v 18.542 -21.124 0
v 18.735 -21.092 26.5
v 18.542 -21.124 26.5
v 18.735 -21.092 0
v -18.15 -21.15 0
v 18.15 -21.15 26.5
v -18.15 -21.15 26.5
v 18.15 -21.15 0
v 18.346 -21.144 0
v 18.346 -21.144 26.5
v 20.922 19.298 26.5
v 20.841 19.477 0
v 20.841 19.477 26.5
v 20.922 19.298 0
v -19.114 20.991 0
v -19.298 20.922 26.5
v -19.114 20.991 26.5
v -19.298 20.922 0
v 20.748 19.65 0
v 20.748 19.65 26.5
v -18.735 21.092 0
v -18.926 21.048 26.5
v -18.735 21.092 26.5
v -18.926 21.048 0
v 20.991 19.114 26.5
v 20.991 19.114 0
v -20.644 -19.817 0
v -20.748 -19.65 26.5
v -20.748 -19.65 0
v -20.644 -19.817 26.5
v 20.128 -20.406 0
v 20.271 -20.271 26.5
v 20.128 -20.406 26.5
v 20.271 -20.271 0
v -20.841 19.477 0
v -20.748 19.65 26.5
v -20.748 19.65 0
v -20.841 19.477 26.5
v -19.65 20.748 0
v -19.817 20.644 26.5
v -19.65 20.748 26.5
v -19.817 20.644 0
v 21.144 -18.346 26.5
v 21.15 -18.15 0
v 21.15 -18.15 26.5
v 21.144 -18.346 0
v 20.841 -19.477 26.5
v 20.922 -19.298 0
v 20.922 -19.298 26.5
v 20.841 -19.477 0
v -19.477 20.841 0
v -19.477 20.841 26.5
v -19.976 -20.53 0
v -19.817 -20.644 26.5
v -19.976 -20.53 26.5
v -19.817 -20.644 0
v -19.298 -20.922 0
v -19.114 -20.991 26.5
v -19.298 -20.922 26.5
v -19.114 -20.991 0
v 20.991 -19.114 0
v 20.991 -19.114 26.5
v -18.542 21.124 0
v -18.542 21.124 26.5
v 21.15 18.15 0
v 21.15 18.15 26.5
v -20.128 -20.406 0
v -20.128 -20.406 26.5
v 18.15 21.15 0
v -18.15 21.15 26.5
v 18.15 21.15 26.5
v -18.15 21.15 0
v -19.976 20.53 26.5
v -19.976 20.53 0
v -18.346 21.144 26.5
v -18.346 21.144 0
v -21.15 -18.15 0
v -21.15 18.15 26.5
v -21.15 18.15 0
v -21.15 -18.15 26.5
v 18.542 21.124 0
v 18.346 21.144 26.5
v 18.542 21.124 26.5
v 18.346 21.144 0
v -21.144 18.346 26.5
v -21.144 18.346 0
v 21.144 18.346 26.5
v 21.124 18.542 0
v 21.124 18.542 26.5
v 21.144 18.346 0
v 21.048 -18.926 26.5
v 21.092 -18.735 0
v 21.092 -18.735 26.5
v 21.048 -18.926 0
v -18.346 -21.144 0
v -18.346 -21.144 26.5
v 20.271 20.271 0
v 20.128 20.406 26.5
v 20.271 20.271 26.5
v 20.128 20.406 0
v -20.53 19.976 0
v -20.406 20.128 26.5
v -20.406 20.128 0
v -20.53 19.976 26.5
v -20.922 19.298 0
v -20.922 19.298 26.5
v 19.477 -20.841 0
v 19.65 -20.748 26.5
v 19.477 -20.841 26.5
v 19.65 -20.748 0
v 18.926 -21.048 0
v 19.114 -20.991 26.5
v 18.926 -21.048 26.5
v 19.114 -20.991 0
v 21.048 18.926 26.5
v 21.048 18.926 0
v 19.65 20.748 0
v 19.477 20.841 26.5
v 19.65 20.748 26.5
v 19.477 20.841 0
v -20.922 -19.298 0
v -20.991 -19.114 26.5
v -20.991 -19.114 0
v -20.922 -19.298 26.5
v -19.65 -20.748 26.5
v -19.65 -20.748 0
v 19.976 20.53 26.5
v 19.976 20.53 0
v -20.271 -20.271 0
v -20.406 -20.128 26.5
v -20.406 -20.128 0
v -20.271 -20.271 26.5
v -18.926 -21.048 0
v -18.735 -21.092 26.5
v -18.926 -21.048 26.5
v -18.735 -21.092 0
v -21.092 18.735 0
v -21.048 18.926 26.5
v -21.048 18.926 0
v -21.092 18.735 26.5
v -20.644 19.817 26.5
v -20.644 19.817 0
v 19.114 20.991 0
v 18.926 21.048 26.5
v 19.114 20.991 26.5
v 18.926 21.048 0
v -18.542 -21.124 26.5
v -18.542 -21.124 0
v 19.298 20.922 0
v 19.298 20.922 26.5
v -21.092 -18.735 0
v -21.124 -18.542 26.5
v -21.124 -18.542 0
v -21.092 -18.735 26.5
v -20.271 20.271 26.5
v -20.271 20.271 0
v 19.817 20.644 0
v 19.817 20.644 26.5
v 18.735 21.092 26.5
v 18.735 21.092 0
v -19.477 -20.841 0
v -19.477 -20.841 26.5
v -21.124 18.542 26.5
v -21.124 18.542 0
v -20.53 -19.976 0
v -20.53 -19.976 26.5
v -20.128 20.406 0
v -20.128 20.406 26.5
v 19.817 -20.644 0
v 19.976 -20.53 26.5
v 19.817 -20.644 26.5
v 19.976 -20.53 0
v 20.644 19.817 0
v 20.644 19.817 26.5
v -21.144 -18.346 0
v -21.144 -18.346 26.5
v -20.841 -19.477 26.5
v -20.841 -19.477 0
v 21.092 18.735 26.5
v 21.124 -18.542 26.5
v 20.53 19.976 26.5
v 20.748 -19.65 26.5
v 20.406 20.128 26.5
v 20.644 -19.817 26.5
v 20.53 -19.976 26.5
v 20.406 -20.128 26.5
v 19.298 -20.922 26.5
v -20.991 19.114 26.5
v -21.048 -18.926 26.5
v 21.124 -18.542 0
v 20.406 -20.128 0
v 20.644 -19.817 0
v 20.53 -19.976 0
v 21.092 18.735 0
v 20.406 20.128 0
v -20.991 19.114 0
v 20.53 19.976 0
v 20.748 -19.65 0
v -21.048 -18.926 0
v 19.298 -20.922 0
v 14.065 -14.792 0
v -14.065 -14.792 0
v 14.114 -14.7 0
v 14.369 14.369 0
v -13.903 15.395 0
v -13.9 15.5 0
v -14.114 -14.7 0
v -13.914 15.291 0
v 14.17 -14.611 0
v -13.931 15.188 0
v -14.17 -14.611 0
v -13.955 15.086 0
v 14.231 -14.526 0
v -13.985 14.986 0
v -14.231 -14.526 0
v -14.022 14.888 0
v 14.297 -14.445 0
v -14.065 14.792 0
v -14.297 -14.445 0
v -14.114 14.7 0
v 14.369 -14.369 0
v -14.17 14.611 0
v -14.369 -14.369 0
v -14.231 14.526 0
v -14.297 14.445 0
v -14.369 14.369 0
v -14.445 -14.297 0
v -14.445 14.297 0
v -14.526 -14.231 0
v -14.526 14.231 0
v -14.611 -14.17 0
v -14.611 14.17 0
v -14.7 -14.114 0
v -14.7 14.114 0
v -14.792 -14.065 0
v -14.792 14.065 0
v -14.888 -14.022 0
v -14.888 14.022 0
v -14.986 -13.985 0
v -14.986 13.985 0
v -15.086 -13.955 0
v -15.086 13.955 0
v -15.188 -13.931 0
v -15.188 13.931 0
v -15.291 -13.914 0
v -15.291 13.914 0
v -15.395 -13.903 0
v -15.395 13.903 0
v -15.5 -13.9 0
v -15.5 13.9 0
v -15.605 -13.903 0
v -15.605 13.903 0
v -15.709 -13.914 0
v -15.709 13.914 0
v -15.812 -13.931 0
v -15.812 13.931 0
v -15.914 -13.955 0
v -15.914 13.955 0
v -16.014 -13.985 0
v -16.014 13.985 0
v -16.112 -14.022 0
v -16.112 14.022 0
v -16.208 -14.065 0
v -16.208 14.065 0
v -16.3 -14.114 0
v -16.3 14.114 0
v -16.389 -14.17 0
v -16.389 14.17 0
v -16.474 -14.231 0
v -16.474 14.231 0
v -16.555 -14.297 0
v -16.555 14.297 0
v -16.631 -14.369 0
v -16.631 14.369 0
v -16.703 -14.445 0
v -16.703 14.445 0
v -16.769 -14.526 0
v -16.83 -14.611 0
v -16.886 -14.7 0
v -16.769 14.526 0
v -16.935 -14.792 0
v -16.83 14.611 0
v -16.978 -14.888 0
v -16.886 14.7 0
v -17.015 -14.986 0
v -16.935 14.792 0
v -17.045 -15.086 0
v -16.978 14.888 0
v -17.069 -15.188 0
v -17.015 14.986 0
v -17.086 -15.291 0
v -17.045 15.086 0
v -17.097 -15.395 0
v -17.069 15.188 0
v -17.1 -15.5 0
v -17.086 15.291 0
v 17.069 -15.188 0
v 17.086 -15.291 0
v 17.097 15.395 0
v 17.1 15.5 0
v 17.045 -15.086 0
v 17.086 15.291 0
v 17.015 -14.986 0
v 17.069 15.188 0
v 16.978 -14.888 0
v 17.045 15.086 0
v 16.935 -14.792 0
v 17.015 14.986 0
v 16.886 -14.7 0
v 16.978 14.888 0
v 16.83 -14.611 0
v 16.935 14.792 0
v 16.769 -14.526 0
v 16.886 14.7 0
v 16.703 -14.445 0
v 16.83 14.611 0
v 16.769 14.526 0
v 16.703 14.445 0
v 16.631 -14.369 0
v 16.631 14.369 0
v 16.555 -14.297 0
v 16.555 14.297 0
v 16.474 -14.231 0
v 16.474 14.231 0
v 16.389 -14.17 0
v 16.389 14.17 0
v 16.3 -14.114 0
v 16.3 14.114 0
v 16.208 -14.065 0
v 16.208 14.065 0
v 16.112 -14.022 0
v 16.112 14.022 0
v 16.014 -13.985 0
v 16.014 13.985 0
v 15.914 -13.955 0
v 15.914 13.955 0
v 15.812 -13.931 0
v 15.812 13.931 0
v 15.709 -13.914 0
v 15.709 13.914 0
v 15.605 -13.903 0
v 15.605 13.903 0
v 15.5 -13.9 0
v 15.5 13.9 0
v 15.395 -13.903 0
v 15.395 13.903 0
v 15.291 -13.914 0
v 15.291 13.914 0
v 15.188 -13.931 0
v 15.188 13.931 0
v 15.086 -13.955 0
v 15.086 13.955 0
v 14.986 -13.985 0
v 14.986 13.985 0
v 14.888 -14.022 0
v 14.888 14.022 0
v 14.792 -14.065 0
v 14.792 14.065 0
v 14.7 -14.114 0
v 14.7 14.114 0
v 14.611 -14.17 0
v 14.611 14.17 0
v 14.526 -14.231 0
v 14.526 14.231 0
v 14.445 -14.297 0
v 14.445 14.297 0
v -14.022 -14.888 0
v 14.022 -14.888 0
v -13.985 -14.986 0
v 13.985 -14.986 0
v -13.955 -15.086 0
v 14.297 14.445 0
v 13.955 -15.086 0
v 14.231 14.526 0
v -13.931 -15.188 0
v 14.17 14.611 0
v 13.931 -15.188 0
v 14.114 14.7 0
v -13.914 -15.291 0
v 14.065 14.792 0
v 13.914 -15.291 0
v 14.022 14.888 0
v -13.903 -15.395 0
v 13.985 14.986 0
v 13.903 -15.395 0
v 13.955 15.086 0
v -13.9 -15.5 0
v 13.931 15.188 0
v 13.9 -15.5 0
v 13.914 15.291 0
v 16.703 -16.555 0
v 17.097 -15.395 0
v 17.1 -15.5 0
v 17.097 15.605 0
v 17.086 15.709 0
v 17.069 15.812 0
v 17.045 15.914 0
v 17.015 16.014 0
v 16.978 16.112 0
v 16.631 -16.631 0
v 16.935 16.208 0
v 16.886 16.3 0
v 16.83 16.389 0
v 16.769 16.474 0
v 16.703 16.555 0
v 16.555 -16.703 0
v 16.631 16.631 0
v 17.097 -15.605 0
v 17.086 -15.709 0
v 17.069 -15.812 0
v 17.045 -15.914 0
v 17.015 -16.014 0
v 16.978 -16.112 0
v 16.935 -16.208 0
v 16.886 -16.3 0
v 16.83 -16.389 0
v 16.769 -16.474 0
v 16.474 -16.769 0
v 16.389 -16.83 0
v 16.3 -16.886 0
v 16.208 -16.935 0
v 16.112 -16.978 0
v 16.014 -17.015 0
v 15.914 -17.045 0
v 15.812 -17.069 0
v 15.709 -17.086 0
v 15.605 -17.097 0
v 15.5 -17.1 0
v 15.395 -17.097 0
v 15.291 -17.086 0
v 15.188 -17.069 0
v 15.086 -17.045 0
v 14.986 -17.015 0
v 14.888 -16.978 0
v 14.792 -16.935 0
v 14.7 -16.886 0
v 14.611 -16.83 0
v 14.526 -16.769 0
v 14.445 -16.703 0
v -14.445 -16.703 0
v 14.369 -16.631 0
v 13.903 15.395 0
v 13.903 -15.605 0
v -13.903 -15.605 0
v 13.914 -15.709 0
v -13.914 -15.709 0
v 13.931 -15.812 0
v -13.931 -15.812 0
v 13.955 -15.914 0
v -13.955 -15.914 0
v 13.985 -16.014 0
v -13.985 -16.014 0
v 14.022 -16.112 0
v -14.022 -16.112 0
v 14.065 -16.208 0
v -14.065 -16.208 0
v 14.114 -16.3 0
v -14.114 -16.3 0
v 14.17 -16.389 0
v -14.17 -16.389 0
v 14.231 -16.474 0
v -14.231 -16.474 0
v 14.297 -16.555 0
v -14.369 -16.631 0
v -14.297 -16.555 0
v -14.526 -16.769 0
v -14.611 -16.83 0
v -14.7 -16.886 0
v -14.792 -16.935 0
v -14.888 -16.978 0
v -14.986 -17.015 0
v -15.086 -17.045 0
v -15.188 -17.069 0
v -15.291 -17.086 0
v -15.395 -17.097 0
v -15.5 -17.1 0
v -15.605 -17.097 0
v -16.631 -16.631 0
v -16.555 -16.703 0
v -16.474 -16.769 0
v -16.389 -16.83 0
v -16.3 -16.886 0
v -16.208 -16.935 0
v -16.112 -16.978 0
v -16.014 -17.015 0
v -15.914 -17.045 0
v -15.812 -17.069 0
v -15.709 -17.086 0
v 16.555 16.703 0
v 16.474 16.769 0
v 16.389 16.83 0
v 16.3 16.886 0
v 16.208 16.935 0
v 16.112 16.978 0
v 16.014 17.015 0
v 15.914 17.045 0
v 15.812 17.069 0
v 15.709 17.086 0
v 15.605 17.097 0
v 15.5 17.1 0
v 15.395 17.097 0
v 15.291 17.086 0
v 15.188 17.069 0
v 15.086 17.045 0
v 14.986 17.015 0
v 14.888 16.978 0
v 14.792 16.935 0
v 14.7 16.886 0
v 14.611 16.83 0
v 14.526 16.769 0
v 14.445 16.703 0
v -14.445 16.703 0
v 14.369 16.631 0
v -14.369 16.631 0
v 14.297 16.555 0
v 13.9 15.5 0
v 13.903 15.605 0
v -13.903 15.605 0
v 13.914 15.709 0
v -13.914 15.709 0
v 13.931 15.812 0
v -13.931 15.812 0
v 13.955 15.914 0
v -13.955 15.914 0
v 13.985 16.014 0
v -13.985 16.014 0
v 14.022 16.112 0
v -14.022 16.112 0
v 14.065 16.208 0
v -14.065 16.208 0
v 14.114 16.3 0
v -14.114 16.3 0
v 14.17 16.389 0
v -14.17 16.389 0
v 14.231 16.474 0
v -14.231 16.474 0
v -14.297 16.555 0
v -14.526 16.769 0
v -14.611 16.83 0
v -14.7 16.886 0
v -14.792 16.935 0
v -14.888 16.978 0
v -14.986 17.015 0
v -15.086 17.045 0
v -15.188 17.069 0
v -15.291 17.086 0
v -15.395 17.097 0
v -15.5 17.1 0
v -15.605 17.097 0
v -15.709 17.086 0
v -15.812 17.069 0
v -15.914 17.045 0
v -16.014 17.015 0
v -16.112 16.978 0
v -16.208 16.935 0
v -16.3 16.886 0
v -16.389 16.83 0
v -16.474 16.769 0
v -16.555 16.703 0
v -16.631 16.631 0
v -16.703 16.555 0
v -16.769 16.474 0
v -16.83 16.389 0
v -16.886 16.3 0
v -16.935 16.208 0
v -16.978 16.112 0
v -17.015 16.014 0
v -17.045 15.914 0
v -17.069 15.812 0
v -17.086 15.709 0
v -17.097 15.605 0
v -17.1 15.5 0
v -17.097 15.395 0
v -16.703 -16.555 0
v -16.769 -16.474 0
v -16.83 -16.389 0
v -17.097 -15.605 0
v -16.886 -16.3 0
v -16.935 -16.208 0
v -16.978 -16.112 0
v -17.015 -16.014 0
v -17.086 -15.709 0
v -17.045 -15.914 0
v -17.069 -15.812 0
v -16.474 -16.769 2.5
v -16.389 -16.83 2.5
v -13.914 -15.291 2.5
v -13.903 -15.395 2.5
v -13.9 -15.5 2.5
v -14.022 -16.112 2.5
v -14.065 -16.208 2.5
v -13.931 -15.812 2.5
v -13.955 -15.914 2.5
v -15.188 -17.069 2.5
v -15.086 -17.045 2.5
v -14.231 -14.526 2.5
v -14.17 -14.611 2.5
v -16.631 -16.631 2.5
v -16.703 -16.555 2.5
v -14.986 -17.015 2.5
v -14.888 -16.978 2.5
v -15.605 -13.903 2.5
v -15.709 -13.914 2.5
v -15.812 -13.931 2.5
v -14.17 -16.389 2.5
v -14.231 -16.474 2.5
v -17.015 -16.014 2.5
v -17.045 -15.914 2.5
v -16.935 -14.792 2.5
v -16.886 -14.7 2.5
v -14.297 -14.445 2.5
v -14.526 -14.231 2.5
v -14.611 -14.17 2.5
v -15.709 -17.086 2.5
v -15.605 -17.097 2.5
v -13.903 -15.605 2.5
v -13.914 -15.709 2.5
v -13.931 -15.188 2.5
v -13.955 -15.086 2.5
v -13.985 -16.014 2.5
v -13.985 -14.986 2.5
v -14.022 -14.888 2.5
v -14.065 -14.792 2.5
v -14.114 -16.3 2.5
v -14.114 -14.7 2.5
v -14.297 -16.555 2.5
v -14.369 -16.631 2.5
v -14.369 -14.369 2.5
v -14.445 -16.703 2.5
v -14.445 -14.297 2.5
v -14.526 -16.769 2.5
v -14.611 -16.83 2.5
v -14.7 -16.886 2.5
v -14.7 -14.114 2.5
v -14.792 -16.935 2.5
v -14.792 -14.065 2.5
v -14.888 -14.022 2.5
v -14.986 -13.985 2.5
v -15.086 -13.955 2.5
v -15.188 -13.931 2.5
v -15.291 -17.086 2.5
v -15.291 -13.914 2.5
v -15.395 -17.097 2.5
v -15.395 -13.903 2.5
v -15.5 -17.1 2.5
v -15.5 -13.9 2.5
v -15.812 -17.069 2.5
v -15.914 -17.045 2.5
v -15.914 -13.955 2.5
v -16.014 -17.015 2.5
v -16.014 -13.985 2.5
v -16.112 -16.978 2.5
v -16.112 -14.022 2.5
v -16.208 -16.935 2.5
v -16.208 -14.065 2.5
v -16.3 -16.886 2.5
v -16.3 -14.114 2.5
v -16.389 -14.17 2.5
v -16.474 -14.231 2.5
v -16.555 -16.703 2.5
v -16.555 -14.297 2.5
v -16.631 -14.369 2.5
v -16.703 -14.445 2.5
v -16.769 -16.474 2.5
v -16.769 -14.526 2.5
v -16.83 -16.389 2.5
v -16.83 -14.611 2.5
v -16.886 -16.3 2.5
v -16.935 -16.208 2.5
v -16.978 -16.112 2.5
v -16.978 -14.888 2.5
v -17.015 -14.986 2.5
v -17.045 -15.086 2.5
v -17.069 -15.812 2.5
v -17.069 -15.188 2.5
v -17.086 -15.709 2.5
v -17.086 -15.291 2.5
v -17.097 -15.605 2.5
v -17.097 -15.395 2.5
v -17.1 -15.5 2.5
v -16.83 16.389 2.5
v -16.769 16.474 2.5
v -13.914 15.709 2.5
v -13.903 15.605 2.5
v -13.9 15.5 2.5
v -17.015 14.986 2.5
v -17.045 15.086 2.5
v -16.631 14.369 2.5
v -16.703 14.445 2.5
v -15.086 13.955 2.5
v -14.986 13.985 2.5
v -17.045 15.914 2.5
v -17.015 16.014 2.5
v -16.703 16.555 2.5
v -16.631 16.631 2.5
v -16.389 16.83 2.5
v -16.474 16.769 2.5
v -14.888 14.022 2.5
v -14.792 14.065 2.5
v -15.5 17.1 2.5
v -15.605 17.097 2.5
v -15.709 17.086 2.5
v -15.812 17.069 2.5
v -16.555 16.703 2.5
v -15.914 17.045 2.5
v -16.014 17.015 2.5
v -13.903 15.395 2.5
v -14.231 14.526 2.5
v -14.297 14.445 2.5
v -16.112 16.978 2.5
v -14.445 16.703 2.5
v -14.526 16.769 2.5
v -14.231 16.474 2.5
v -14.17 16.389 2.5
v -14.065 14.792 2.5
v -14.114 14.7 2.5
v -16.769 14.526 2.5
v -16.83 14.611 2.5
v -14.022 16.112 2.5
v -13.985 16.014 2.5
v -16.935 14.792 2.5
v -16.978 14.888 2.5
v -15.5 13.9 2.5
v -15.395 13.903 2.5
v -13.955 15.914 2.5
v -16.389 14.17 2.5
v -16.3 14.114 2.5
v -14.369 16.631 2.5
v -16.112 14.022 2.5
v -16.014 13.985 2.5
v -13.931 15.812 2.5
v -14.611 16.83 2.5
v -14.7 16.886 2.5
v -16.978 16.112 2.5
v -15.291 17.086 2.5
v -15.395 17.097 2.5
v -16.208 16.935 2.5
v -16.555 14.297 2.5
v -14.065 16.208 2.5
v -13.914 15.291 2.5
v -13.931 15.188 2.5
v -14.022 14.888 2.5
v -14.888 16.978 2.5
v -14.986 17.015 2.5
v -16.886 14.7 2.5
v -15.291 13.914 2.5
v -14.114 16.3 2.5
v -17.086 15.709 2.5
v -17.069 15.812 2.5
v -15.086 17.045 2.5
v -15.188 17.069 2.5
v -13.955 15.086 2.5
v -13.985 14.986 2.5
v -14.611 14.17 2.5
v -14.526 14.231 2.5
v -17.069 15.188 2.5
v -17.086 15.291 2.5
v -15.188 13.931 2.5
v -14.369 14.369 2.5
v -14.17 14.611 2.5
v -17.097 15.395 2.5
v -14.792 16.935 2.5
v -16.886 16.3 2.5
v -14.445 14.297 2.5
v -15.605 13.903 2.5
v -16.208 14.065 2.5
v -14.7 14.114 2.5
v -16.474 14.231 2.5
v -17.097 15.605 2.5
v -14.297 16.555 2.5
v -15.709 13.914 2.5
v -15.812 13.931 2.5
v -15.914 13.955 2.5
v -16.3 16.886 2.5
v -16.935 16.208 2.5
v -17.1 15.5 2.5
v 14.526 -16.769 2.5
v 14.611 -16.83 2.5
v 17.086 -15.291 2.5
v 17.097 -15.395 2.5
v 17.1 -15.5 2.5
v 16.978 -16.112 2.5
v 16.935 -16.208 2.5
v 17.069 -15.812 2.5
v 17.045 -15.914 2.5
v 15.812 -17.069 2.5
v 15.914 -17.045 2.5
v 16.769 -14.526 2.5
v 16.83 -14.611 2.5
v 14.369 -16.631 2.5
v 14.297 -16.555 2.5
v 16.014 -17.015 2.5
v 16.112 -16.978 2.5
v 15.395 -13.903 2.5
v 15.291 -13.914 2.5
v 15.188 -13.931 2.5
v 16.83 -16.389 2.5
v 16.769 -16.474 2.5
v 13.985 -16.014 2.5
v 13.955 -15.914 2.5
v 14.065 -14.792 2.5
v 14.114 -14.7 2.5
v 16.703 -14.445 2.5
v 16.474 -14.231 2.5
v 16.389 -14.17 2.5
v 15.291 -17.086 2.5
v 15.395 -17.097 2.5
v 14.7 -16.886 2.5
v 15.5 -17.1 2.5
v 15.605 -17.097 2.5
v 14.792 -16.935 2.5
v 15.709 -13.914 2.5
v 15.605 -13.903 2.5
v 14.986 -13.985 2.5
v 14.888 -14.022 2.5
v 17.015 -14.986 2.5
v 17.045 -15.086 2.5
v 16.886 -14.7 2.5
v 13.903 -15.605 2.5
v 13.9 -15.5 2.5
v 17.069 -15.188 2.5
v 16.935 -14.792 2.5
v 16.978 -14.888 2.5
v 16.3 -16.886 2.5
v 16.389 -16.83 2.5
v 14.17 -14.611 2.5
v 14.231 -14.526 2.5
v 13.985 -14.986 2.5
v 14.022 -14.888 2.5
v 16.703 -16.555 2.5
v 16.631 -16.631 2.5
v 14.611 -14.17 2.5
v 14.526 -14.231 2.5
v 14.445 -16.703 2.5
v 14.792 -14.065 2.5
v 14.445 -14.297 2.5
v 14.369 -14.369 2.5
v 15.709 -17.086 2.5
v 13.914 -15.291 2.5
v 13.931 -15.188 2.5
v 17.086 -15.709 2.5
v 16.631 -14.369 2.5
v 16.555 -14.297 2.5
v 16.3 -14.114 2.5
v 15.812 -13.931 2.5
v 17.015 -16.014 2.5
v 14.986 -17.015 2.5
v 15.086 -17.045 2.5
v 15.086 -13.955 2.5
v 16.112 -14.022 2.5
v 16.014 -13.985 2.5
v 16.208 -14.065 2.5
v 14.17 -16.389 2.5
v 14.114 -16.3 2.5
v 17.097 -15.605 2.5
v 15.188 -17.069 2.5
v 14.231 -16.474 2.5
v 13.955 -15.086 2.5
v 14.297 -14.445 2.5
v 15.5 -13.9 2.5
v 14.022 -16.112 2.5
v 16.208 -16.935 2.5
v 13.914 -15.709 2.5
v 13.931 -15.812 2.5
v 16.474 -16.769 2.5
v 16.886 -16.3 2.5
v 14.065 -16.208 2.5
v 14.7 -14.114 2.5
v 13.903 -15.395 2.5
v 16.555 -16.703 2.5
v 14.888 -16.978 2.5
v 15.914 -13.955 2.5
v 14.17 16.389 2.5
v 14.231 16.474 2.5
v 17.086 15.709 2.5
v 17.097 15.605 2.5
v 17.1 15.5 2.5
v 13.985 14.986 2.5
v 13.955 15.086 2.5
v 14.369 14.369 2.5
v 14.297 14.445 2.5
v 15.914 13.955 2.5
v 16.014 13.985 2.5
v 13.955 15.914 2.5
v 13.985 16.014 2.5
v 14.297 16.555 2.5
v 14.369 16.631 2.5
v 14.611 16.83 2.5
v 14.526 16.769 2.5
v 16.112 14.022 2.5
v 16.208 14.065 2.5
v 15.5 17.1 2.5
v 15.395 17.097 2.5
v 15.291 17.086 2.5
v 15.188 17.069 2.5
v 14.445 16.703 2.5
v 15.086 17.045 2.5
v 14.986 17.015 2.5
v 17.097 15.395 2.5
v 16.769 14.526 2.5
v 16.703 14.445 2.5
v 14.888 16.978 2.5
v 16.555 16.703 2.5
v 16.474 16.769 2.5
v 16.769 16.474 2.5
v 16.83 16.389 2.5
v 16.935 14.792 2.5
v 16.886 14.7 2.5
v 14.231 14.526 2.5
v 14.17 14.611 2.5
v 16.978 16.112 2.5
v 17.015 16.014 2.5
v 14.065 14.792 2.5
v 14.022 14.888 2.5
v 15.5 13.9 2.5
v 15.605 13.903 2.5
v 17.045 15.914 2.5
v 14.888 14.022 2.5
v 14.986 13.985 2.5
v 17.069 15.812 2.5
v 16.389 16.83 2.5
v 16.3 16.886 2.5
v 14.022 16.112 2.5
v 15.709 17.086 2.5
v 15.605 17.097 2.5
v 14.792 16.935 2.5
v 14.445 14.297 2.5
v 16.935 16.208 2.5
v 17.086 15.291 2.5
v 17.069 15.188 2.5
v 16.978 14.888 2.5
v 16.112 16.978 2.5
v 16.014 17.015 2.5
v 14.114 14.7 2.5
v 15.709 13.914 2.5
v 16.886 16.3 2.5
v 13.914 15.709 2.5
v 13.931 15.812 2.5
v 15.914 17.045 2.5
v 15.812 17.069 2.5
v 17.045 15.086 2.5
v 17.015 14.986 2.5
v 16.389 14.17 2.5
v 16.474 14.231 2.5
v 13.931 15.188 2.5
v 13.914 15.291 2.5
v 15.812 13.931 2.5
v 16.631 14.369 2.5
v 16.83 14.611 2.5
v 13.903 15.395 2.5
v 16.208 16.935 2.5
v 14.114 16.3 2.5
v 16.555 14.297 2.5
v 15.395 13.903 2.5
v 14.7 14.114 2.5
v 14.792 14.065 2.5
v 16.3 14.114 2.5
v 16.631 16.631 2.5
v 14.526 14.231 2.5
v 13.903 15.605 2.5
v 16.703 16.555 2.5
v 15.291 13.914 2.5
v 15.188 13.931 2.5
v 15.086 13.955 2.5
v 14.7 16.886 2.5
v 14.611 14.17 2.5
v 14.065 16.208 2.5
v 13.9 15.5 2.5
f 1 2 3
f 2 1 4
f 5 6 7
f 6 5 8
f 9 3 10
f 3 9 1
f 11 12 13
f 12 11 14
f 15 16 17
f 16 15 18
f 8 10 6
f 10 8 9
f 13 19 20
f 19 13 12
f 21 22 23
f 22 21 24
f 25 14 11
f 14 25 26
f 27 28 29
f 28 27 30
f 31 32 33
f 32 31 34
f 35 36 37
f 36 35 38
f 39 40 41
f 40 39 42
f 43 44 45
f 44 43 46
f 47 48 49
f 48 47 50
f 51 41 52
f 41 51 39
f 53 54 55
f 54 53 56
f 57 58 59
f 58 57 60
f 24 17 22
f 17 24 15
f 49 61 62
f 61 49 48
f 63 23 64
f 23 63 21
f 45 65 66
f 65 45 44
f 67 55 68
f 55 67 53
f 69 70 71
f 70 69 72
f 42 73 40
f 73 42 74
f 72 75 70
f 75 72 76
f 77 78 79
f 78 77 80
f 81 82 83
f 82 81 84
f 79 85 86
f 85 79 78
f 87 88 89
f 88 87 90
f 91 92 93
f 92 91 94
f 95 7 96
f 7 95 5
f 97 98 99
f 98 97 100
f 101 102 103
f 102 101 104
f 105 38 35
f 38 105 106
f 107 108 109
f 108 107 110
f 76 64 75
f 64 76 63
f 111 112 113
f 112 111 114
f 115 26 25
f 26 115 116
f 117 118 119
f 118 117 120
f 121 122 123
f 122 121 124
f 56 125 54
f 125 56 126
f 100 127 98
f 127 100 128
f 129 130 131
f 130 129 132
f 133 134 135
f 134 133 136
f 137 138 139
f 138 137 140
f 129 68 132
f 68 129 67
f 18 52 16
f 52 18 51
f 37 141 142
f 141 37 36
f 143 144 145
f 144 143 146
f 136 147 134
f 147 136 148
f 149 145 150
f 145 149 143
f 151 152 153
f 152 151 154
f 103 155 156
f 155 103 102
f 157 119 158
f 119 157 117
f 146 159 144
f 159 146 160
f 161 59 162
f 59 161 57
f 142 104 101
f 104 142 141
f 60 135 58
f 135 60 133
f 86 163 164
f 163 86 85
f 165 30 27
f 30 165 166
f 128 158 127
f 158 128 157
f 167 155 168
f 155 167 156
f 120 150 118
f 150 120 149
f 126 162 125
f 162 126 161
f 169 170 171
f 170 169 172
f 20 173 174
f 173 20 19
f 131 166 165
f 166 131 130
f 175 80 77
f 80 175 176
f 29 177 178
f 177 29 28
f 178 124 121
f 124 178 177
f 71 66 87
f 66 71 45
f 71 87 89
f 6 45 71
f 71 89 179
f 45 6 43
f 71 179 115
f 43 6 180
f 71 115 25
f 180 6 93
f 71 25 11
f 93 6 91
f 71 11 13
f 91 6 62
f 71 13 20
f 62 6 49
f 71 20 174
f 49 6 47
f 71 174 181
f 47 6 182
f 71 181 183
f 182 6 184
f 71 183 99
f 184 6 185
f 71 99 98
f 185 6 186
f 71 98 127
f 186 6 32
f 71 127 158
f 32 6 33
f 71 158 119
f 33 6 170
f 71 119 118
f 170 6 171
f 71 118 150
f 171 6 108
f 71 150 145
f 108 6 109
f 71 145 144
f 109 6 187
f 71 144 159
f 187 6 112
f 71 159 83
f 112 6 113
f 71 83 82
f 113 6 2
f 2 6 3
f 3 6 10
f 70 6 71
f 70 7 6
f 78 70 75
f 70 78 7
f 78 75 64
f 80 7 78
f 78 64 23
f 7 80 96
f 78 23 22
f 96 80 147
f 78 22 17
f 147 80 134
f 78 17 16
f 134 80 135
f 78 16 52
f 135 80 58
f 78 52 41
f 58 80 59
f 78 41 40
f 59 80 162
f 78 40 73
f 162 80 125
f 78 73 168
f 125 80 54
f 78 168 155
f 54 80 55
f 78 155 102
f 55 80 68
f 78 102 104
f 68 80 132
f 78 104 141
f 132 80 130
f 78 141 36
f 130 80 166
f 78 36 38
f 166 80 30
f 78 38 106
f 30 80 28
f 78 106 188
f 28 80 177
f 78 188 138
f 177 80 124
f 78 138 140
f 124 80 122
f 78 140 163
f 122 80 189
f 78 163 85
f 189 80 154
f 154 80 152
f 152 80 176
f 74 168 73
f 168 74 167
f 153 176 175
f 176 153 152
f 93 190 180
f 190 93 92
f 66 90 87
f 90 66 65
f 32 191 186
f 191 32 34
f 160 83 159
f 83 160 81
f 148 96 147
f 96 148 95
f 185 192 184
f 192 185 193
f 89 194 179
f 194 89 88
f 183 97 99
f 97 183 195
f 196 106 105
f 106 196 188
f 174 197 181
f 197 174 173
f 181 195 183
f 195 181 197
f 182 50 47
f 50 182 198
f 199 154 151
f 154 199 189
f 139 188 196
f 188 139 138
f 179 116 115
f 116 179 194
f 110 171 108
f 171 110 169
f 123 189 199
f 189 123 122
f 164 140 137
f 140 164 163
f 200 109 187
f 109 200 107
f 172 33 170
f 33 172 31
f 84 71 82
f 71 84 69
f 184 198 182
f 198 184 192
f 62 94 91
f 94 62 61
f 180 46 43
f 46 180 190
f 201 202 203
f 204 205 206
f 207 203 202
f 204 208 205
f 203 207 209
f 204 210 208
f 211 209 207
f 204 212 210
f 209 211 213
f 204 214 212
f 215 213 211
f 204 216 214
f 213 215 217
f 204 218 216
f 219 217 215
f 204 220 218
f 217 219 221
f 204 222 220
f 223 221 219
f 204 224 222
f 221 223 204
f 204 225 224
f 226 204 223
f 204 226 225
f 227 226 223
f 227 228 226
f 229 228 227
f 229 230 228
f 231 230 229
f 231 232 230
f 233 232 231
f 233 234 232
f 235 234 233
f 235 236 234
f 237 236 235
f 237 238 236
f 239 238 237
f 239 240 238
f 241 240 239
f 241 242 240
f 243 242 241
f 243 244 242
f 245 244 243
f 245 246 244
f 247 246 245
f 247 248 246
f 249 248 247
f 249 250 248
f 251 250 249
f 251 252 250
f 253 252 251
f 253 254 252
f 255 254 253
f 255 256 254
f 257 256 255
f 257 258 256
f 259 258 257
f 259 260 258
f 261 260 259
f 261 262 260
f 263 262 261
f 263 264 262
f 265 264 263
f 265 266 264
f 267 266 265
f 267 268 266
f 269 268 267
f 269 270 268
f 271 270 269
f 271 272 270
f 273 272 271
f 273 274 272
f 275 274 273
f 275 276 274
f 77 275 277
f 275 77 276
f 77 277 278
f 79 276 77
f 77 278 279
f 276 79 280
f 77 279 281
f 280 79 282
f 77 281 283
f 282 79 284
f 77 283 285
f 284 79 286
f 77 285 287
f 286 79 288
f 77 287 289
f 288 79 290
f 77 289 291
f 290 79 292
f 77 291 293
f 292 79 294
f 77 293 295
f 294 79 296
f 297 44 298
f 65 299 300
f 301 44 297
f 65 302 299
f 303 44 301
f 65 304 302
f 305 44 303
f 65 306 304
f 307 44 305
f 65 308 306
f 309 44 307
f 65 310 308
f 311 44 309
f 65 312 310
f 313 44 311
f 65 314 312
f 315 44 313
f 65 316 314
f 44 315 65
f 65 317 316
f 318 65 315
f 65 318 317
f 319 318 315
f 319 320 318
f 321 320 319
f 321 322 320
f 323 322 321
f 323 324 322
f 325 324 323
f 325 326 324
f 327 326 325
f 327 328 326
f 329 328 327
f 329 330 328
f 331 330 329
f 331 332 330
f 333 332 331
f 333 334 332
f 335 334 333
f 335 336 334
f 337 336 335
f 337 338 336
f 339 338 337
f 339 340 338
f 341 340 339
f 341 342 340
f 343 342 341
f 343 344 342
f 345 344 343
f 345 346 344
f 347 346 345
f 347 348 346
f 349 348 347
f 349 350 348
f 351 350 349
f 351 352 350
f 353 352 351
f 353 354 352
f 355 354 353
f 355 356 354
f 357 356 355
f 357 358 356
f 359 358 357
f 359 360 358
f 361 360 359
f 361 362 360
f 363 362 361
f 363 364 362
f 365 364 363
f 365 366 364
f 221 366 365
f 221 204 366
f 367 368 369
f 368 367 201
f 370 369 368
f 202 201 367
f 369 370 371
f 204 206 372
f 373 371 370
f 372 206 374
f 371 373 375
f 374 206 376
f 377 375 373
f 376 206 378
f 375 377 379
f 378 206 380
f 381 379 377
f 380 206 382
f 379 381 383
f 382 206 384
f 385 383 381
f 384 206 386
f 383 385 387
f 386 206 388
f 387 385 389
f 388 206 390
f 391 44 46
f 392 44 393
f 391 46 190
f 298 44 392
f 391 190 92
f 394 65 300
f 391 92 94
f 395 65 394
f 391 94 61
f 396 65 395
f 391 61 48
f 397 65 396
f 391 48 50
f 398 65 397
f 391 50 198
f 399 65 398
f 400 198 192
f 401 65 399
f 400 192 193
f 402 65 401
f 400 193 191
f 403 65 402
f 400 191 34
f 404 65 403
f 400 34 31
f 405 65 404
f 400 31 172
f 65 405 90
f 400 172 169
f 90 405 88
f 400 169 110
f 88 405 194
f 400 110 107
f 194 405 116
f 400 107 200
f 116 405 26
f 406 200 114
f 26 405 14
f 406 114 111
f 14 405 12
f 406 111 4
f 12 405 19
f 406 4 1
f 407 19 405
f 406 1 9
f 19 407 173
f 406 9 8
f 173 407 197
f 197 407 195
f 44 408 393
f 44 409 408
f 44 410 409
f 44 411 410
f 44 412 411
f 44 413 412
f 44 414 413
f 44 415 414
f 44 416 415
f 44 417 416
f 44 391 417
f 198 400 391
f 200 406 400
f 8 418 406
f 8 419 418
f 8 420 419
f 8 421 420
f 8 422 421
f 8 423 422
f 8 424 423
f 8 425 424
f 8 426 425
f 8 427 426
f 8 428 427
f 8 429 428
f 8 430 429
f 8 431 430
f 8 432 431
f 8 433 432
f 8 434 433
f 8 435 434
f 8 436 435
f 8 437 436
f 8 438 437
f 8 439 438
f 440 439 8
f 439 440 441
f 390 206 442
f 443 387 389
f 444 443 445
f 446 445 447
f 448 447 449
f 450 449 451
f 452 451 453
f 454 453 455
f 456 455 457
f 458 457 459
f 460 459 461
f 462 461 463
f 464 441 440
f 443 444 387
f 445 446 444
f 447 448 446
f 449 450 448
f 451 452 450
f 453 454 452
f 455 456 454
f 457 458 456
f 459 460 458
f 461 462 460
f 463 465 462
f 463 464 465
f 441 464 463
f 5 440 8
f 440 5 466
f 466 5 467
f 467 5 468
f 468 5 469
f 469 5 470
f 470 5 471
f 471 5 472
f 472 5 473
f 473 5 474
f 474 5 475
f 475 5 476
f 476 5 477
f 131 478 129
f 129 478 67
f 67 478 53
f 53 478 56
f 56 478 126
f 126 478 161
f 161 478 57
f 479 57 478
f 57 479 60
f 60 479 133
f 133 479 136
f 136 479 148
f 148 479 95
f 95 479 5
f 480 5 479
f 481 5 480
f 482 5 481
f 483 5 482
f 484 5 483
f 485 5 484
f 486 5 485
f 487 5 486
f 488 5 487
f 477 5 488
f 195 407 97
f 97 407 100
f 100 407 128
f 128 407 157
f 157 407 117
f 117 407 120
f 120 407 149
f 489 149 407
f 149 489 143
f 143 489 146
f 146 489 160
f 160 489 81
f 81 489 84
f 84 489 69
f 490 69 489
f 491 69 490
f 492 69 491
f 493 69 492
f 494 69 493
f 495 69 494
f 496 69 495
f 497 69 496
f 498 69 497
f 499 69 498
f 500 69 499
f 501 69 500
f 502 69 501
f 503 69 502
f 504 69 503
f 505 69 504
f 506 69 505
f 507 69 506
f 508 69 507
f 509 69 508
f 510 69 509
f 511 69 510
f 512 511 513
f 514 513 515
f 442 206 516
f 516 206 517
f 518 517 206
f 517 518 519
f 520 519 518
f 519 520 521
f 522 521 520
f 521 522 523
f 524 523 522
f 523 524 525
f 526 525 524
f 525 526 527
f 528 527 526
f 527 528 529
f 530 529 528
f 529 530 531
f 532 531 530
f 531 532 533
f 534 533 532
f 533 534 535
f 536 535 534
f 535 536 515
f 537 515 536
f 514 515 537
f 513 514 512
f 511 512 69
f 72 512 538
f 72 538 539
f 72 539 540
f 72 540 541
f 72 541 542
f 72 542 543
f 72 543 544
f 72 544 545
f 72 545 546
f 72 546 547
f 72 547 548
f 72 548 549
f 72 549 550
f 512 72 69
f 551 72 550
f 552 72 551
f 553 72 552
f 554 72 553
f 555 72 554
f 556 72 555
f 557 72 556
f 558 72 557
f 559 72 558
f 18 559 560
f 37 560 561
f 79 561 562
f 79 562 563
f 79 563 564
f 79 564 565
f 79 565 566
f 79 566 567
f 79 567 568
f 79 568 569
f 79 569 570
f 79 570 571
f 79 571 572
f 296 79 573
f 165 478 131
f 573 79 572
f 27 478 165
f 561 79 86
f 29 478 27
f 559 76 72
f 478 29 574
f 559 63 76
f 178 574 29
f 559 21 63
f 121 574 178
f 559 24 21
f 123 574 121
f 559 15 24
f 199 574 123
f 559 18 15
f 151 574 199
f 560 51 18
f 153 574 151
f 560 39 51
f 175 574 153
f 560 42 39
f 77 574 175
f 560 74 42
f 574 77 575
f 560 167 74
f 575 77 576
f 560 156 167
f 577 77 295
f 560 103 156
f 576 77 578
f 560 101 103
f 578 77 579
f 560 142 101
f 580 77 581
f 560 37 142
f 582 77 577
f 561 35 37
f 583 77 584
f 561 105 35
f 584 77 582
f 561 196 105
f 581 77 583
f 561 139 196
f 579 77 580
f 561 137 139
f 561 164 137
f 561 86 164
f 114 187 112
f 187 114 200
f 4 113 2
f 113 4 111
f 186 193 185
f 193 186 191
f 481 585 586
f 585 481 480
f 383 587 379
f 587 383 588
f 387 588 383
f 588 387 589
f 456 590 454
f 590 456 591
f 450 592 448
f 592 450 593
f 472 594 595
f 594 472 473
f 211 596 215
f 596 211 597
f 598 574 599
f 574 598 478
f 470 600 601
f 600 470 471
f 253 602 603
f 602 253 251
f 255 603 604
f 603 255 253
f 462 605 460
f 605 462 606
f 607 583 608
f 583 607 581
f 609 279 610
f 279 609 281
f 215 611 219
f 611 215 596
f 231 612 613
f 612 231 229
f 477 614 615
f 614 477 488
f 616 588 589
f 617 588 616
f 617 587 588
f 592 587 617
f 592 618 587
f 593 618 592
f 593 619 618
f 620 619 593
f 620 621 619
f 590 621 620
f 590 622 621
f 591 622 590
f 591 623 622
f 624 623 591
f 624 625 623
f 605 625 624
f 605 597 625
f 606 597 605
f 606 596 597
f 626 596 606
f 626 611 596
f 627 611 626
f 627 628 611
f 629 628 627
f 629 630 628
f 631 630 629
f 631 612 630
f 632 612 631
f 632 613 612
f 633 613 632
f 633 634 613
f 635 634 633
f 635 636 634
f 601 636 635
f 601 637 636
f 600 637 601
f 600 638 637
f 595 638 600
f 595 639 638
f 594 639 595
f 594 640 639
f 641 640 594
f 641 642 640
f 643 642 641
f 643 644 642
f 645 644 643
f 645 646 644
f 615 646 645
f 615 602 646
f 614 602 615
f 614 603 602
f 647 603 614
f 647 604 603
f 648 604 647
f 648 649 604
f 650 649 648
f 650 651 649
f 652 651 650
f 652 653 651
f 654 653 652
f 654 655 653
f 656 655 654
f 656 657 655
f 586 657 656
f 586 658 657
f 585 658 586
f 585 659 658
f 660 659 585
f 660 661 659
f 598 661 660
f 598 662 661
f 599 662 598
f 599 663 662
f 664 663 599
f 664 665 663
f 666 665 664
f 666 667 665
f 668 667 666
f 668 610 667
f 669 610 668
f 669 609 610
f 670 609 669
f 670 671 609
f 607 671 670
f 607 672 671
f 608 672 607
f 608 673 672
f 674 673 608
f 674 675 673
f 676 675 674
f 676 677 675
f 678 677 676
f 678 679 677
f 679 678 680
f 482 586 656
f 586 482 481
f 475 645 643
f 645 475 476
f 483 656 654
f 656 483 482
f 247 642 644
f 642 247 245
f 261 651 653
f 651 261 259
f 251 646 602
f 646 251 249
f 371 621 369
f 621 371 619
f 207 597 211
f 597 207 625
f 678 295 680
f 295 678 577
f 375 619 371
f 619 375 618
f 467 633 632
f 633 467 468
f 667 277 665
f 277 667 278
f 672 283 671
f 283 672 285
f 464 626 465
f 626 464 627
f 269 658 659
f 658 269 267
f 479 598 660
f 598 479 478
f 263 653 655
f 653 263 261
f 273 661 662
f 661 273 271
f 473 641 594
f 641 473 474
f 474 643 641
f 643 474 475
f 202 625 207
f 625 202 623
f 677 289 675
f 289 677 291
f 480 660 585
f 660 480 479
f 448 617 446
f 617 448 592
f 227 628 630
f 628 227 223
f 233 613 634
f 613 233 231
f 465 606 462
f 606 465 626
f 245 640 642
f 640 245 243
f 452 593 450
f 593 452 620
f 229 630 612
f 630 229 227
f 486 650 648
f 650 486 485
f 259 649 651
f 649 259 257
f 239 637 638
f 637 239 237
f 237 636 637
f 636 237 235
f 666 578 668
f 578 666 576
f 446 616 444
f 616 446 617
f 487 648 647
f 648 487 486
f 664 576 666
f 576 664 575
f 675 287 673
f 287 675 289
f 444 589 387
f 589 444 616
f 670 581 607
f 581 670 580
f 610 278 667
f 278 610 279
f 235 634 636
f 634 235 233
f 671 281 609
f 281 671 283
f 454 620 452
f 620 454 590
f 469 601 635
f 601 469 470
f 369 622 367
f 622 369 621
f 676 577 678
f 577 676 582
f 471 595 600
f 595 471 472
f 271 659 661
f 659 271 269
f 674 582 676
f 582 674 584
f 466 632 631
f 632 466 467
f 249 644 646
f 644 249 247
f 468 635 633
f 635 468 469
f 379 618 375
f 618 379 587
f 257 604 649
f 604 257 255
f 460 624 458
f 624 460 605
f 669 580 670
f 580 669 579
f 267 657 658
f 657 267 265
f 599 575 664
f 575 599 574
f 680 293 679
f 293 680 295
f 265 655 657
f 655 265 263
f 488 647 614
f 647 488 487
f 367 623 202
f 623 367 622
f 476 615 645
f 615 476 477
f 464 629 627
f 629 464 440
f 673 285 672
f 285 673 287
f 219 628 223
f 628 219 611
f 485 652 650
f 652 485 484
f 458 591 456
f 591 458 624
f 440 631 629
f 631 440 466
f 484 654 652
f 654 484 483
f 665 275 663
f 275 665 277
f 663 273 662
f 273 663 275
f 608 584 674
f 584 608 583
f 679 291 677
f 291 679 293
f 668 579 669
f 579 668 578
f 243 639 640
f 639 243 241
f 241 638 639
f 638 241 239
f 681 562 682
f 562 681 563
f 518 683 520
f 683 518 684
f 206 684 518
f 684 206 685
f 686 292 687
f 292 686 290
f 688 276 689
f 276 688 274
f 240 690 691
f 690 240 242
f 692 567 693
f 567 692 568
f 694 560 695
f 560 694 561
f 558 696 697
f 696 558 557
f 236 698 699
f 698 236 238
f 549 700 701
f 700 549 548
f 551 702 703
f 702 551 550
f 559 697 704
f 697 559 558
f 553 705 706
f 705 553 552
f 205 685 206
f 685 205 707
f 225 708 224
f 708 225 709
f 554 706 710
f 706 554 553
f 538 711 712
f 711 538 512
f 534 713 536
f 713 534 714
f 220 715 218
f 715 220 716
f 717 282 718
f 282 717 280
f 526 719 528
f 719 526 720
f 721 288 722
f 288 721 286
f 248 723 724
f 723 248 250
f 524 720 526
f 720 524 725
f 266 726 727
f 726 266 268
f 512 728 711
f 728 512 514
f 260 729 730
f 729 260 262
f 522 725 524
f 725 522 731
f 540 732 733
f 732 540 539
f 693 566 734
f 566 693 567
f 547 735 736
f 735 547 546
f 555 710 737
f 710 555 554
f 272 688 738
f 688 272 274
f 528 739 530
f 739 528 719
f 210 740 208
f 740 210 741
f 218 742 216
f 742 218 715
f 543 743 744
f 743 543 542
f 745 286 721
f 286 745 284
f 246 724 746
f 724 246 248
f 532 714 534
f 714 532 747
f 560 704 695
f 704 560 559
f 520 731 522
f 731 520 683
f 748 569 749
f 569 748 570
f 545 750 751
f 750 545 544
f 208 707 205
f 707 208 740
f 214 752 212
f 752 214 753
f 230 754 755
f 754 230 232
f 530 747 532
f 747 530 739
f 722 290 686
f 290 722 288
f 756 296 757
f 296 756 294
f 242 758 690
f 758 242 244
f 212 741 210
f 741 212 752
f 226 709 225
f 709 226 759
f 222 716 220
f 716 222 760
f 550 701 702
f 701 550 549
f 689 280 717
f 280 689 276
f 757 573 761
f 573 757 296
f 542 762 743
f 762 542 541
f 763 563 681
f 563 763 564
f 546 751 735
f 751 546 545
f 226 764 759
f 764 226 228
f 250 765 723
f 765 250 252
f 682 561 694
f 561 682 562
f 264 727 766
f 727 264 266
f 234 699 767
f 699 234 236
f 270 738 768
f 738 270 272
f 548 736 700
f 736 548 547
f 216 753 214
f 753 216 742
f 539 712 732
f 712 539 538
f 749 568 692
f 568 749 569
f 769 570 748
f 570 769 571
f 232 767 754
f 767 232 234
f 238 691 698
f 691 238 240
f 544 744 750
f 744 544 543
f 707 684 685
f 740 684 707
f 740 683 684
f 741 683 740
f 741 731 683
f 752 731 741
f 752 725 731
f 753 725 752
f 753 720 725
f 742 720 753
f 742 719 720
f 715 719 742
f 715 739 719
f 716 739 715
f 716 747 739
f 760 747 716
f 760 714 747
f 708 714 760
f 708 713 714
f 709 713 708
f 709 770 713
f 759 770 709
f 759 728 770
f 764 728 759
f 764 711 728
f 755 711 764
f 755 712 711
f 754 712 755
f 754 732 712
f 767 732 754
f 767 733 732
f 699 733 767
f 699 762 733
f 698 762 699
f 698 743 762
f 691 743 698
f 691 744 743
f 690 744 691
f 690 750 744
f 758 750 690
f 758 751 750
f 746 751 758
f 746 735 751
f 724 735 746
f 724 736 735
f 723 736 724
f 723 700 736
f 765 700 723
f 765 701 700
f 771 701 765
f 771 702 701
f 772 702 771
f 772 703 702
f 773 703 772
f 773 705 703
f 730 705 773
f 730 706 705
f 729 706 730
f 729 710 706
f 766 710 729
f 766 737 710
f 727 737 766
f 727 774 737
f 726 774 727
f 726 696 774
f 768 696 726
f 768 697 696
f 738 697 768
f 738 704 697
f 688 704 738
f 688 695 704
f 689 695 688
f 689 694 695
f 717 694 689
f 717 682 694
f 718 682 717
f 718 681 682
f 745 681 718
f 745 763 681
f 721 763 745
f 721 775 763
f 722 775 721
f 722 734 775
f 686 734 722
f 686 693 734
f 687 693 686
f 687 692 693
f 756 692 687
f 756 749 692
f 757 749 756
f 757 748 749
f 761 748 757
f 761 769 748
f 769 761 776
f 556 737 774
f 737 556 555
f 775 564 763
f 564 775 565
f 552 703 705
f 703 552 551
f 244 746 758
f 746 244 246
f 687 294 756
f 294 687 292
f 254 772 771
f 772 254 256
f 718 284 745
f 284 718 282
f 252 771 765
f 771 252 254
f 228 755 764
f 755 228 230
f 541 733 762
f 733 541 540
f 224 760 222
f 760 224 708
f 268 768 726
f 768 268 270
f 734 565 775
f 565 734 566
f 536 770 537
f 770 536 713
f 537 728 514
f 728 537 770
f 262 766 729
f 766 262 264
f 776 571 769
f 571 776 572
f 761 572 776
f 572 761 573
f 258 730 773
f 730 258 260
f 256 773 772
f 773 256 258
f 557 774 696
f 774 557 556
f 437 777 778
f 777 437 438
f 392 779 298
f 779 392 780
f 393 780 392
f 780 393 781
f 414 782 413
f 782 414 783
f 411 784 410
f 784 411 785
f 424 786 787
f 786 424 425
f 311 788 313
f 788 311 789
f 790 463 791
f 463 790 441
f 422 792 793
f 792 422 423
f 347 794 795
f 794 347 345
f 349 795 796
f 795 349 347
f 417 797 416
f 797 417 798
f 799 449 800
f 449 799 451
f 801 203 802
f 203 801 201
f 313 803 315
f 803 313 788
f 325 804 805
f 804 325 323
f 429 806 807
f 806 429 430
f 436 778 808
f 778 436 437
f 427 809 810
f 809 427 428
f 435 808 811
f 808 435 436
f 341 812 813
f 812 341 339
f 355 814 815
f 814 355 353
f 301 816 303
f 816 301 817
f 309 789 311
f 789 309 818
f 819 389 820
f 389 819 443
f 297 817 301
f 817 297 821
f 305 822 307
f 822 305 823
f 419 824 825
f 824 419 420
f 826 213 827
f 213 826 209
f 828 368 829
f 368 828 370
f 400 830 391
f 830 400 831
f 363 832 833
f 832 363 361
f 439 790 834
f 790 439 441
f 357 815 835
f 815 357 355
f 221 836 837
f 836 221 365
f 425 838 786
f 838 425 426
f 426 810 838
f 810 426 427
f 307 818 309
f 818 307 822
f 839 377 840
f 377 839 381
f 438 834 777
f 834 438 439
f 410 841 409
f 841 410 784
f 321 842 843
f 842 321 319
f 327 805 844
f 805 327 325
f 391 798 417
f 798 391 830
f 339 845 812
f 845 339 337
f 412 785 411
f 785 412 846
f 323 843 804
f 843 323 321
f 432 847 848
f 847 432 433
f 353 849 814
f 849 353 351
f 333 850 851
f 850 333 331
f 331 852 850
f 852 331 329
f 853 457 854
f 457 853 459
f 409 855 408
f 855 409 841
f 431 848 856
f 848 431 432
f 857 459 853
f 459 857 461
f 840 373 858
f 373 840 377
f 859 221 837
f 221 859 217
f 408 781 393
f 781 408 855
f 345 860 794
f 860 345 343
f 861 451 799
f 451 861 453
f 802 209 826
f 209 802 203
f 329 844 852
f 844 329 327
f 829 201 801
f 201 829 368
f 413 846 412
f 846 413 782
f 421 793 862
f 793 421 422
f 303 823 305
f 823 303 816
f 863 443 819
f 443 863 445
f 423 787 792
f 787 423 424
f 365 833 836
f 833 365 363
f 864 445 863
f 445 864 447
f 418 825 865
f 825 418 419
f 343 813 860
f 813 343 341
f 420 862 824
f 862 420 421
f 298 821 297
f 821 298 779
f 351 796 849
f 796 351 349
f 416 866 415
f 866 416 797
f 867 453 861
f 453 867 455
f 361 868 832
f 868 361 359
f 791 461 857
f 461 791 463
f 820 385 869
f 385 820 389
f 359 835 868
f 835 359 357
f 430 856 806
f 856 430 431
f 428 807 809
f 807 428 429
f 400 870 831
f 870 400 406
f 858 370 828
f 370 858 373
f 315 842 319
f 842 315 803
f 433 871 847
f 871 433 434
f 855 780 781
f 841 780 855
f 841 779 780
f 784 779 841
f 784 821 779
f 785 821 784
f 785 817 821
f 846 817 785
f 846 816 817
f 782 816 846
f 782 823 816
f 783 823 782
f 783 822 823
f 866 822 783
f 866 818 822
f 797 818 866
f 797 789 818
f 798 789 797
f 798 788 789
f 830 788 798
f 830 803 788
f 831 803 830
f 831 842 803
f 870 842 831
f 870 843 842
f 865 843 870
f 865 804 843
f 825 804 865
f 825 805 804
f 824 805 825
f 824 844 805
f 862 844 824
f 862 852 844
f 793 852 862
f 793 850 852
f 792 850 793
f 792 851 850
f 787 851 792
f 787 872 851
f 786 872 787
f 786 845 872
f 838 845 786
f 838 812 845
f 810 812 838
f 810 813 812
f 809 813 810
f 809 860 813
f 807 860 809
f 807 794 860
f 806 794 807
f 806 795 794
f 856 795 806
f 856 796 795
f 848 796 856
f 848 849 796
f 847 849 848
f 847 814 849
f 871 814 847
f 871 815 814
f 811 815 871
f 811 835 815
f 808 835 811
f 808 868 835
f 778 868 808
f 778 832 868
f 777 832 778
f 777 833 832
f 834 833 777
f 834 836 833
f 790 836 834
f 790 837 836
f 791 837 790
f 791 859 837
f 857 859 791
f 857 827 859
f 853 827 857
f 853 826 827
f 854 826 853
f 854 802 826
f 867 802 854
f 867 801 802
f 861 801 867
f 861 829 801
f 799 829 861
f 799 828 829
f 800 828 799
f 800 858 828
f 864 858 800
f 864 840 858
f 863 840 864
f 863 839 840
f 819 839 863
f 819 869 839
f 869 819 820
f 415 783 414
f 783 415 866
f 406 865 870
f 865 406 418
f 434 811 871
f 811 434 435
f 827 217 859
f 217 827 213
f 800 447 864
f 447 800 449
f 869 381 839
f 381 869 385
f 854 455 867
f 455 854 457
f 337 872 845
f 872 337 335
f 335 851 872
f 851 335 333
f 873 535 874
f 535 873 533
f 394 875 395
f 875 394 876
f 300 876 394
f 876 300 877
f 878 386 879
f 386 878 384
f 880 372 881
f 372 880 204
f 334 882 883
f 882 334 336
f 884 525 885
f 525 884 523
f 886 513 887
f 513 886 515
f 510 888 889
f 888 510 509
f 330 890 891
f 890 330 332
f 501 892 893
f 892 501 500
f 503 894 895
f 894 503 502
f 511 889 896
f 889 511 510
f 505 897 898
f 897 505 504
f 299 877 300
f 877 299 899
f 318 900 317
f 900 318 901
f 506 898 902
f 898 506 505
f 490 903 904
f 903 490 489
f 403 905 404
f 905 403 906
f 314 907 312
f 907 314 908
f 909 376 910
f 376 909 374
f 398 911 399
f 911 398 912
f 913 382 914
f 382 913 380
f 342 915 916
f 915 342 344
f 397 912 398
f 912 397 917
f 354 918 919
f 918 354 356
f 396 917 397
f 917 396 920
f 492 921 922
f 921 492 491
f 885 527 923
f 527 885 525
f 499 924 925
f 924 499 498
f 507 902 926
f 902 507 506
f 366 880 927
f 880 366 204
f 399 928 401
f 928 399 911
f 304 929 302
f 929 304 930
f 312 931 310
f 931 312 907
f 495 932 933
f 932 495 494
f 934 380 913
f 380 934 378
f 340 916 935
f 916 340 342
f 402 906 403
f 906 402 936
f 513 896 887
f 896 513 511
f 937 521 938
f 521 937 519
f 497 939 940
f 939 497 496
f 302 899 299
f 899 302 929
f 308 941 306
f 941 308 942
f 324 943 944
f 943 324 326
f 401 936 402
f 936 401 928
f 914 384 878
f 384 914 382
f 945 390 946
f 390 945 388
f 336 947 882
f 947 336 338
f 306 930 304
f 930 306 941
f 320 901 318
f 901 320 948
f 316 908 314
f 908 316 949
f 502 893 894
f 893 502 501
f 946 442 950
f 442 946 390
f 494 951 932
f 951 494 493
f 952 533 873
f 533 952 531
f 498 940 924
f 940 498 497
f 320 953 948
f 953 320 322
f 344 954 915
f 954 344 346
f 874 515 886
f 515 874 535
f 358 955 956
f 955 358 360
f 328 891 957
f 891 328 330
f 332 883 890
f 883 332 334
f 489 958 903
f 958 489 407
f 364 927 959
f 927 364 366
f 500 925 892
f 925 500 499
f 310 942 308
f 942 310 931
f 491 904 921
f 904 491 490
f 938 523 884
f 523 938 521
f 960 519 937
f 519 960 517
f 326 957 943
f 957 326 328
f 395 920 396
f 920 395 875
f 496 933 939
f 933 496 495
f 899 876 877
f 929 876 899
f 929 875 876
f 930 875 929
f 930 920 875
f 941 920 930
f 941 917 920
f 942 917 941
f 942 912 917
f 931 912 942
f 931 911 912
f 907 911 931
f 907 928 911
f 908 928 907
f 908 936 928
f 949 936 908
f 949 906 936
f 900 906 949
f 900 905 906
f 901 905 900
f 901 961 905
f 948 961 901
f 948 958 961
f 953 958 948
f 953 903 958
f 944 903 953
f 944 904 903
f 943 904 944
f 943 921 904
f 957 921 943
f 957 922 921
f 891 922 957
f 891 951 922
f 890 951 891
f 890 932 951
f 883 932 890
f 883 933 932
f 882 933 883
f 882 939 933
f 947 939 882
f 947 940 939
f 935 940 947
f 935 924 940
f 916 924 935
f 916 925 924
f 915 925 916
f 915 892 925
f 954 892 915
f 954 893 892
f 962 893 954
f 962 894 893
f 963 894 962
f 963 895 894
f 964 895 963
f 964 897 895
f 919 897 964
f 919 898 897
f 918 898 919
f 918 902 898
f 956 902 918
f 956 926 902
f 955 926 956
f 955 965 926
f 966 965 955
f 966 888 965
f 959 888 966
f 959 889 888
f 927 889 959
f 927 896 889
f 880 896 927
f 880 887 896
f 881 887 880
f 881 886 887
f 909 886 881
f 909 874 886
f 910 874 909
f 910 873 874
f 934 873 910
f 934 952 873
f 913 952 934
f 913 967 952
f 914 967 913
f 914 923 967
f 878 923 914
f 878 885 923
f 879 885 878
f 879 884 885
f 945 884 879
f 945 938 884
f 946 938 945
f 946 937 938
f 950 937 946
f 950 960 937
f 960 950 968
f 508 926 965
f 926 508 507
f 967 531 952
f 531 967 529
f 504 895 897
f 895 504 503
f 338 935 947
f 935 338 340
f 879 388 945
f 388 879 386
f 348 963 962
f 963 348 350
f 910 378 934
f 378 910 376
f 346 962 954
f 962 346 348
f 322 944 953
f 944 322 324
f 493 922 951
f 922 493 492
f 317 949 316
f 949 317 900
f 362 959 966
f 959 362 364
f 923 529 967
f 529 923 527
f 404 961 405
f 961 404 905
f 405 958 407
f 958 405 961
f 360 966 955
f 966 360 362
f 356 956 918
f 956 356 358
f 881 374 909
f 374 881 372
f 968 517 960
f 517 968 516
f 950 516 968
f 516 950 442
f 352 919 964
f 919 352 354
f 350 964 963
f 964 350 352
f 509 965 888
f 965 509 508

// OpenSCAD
$fn = 96;

// Parameters (mm)
face_w = 42.3;          // square face width
body_len = 26.5;        // motor body length (excluding shaft)
shaft_d = 5.0;          // shaft diameter
shaft_len = 20.0;       // assumed visible shaft length
mount_spacing = 31.0;   // center-to-center mounting hole spacing
mount_hole_d = 3.2;     // typical NEMA17 clearance (assumed)
corner_r = 3.0;         // assumed corner radius
front_plate_th = 2.0;   // assumed front plate thickness
boss_d = 22.0;          // assumed front boss diameter
boss_h = 2.0;           // assumed boss height

module rounded_square_prism(w, h, r, center=false) {
    linear_extrude(height=h, center=center)
        offset(r=r)
            square([w-2*r, w-2*r], center=true);
}

module motor_body() {
    // Main body
    color([0.25,0.25,0.27])
    translate([0,0,body_len/2])
        rounded_square_prism(face_w, body_len, corner_r, center=true);

    // Front plate
    color([0.35,0.35,0.38])
    translate([0,0,front_plate_th/2])
        rounded_square_prism(face_w, front_plate_th, corner_r, center=true);

    // Front boss
    color([0.55,0.55,0.58])
    translate([0,0,front_plate_th])
        cylinder(d=boss_d, h=boss_h);

    // Shaft
    color([0.75,0.75,0.78])
    translate([0,0,front_plate_th + boss_h])
        cylinder(d=shaft_d, h=shaft_len);
}

module mounting_holes() {
    for (sx = [-1, 1], sy = [-1, 1]) {
        translate([sx*mount_spacing/2, sy*mount_spacing/2, -0.5])
            cylinder(d=mount_hole_d, h=front_plate_th + 1.0);
    }
}

difference() {
    motor_body();
    mounting_holes();
}
